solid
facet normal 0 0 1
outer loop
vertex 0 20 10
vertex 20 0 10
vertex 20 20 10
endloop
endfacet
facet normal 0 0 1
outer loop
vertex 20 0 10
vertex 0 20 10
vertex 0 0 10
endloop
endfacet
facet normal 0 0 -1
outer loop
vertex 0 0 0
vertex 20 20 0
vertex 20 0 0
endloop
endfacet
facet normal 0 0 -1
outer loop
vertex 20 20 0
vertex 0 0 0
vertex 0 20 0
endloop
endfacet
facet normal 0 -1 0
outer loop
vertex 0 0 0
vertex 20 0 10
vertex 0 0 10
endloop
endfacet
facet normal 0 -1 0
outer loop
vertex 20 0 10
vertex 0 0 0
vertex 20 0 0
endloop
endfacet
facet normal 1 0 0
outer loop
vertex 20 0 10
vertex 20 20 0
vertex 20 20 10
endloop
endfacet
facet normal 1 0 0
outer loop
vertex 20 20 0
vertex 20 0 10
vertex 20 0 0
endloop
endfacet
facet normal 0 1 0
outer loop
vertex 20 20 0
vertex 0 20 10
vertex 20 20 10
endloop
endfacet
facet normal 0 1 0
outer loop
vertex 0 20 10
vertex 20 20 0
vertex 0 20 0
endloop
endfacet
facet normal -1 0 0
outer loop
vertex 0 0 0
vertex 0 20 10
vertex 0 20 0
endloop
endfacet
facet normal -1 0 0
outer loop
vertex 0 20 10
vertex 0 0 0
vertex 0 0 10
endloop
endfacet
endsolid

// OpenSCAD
// A finished plain-SCAD target; dimensions stay source-authored.
$fn = 32;
width = 20;
cube([width, 20, 10]);
